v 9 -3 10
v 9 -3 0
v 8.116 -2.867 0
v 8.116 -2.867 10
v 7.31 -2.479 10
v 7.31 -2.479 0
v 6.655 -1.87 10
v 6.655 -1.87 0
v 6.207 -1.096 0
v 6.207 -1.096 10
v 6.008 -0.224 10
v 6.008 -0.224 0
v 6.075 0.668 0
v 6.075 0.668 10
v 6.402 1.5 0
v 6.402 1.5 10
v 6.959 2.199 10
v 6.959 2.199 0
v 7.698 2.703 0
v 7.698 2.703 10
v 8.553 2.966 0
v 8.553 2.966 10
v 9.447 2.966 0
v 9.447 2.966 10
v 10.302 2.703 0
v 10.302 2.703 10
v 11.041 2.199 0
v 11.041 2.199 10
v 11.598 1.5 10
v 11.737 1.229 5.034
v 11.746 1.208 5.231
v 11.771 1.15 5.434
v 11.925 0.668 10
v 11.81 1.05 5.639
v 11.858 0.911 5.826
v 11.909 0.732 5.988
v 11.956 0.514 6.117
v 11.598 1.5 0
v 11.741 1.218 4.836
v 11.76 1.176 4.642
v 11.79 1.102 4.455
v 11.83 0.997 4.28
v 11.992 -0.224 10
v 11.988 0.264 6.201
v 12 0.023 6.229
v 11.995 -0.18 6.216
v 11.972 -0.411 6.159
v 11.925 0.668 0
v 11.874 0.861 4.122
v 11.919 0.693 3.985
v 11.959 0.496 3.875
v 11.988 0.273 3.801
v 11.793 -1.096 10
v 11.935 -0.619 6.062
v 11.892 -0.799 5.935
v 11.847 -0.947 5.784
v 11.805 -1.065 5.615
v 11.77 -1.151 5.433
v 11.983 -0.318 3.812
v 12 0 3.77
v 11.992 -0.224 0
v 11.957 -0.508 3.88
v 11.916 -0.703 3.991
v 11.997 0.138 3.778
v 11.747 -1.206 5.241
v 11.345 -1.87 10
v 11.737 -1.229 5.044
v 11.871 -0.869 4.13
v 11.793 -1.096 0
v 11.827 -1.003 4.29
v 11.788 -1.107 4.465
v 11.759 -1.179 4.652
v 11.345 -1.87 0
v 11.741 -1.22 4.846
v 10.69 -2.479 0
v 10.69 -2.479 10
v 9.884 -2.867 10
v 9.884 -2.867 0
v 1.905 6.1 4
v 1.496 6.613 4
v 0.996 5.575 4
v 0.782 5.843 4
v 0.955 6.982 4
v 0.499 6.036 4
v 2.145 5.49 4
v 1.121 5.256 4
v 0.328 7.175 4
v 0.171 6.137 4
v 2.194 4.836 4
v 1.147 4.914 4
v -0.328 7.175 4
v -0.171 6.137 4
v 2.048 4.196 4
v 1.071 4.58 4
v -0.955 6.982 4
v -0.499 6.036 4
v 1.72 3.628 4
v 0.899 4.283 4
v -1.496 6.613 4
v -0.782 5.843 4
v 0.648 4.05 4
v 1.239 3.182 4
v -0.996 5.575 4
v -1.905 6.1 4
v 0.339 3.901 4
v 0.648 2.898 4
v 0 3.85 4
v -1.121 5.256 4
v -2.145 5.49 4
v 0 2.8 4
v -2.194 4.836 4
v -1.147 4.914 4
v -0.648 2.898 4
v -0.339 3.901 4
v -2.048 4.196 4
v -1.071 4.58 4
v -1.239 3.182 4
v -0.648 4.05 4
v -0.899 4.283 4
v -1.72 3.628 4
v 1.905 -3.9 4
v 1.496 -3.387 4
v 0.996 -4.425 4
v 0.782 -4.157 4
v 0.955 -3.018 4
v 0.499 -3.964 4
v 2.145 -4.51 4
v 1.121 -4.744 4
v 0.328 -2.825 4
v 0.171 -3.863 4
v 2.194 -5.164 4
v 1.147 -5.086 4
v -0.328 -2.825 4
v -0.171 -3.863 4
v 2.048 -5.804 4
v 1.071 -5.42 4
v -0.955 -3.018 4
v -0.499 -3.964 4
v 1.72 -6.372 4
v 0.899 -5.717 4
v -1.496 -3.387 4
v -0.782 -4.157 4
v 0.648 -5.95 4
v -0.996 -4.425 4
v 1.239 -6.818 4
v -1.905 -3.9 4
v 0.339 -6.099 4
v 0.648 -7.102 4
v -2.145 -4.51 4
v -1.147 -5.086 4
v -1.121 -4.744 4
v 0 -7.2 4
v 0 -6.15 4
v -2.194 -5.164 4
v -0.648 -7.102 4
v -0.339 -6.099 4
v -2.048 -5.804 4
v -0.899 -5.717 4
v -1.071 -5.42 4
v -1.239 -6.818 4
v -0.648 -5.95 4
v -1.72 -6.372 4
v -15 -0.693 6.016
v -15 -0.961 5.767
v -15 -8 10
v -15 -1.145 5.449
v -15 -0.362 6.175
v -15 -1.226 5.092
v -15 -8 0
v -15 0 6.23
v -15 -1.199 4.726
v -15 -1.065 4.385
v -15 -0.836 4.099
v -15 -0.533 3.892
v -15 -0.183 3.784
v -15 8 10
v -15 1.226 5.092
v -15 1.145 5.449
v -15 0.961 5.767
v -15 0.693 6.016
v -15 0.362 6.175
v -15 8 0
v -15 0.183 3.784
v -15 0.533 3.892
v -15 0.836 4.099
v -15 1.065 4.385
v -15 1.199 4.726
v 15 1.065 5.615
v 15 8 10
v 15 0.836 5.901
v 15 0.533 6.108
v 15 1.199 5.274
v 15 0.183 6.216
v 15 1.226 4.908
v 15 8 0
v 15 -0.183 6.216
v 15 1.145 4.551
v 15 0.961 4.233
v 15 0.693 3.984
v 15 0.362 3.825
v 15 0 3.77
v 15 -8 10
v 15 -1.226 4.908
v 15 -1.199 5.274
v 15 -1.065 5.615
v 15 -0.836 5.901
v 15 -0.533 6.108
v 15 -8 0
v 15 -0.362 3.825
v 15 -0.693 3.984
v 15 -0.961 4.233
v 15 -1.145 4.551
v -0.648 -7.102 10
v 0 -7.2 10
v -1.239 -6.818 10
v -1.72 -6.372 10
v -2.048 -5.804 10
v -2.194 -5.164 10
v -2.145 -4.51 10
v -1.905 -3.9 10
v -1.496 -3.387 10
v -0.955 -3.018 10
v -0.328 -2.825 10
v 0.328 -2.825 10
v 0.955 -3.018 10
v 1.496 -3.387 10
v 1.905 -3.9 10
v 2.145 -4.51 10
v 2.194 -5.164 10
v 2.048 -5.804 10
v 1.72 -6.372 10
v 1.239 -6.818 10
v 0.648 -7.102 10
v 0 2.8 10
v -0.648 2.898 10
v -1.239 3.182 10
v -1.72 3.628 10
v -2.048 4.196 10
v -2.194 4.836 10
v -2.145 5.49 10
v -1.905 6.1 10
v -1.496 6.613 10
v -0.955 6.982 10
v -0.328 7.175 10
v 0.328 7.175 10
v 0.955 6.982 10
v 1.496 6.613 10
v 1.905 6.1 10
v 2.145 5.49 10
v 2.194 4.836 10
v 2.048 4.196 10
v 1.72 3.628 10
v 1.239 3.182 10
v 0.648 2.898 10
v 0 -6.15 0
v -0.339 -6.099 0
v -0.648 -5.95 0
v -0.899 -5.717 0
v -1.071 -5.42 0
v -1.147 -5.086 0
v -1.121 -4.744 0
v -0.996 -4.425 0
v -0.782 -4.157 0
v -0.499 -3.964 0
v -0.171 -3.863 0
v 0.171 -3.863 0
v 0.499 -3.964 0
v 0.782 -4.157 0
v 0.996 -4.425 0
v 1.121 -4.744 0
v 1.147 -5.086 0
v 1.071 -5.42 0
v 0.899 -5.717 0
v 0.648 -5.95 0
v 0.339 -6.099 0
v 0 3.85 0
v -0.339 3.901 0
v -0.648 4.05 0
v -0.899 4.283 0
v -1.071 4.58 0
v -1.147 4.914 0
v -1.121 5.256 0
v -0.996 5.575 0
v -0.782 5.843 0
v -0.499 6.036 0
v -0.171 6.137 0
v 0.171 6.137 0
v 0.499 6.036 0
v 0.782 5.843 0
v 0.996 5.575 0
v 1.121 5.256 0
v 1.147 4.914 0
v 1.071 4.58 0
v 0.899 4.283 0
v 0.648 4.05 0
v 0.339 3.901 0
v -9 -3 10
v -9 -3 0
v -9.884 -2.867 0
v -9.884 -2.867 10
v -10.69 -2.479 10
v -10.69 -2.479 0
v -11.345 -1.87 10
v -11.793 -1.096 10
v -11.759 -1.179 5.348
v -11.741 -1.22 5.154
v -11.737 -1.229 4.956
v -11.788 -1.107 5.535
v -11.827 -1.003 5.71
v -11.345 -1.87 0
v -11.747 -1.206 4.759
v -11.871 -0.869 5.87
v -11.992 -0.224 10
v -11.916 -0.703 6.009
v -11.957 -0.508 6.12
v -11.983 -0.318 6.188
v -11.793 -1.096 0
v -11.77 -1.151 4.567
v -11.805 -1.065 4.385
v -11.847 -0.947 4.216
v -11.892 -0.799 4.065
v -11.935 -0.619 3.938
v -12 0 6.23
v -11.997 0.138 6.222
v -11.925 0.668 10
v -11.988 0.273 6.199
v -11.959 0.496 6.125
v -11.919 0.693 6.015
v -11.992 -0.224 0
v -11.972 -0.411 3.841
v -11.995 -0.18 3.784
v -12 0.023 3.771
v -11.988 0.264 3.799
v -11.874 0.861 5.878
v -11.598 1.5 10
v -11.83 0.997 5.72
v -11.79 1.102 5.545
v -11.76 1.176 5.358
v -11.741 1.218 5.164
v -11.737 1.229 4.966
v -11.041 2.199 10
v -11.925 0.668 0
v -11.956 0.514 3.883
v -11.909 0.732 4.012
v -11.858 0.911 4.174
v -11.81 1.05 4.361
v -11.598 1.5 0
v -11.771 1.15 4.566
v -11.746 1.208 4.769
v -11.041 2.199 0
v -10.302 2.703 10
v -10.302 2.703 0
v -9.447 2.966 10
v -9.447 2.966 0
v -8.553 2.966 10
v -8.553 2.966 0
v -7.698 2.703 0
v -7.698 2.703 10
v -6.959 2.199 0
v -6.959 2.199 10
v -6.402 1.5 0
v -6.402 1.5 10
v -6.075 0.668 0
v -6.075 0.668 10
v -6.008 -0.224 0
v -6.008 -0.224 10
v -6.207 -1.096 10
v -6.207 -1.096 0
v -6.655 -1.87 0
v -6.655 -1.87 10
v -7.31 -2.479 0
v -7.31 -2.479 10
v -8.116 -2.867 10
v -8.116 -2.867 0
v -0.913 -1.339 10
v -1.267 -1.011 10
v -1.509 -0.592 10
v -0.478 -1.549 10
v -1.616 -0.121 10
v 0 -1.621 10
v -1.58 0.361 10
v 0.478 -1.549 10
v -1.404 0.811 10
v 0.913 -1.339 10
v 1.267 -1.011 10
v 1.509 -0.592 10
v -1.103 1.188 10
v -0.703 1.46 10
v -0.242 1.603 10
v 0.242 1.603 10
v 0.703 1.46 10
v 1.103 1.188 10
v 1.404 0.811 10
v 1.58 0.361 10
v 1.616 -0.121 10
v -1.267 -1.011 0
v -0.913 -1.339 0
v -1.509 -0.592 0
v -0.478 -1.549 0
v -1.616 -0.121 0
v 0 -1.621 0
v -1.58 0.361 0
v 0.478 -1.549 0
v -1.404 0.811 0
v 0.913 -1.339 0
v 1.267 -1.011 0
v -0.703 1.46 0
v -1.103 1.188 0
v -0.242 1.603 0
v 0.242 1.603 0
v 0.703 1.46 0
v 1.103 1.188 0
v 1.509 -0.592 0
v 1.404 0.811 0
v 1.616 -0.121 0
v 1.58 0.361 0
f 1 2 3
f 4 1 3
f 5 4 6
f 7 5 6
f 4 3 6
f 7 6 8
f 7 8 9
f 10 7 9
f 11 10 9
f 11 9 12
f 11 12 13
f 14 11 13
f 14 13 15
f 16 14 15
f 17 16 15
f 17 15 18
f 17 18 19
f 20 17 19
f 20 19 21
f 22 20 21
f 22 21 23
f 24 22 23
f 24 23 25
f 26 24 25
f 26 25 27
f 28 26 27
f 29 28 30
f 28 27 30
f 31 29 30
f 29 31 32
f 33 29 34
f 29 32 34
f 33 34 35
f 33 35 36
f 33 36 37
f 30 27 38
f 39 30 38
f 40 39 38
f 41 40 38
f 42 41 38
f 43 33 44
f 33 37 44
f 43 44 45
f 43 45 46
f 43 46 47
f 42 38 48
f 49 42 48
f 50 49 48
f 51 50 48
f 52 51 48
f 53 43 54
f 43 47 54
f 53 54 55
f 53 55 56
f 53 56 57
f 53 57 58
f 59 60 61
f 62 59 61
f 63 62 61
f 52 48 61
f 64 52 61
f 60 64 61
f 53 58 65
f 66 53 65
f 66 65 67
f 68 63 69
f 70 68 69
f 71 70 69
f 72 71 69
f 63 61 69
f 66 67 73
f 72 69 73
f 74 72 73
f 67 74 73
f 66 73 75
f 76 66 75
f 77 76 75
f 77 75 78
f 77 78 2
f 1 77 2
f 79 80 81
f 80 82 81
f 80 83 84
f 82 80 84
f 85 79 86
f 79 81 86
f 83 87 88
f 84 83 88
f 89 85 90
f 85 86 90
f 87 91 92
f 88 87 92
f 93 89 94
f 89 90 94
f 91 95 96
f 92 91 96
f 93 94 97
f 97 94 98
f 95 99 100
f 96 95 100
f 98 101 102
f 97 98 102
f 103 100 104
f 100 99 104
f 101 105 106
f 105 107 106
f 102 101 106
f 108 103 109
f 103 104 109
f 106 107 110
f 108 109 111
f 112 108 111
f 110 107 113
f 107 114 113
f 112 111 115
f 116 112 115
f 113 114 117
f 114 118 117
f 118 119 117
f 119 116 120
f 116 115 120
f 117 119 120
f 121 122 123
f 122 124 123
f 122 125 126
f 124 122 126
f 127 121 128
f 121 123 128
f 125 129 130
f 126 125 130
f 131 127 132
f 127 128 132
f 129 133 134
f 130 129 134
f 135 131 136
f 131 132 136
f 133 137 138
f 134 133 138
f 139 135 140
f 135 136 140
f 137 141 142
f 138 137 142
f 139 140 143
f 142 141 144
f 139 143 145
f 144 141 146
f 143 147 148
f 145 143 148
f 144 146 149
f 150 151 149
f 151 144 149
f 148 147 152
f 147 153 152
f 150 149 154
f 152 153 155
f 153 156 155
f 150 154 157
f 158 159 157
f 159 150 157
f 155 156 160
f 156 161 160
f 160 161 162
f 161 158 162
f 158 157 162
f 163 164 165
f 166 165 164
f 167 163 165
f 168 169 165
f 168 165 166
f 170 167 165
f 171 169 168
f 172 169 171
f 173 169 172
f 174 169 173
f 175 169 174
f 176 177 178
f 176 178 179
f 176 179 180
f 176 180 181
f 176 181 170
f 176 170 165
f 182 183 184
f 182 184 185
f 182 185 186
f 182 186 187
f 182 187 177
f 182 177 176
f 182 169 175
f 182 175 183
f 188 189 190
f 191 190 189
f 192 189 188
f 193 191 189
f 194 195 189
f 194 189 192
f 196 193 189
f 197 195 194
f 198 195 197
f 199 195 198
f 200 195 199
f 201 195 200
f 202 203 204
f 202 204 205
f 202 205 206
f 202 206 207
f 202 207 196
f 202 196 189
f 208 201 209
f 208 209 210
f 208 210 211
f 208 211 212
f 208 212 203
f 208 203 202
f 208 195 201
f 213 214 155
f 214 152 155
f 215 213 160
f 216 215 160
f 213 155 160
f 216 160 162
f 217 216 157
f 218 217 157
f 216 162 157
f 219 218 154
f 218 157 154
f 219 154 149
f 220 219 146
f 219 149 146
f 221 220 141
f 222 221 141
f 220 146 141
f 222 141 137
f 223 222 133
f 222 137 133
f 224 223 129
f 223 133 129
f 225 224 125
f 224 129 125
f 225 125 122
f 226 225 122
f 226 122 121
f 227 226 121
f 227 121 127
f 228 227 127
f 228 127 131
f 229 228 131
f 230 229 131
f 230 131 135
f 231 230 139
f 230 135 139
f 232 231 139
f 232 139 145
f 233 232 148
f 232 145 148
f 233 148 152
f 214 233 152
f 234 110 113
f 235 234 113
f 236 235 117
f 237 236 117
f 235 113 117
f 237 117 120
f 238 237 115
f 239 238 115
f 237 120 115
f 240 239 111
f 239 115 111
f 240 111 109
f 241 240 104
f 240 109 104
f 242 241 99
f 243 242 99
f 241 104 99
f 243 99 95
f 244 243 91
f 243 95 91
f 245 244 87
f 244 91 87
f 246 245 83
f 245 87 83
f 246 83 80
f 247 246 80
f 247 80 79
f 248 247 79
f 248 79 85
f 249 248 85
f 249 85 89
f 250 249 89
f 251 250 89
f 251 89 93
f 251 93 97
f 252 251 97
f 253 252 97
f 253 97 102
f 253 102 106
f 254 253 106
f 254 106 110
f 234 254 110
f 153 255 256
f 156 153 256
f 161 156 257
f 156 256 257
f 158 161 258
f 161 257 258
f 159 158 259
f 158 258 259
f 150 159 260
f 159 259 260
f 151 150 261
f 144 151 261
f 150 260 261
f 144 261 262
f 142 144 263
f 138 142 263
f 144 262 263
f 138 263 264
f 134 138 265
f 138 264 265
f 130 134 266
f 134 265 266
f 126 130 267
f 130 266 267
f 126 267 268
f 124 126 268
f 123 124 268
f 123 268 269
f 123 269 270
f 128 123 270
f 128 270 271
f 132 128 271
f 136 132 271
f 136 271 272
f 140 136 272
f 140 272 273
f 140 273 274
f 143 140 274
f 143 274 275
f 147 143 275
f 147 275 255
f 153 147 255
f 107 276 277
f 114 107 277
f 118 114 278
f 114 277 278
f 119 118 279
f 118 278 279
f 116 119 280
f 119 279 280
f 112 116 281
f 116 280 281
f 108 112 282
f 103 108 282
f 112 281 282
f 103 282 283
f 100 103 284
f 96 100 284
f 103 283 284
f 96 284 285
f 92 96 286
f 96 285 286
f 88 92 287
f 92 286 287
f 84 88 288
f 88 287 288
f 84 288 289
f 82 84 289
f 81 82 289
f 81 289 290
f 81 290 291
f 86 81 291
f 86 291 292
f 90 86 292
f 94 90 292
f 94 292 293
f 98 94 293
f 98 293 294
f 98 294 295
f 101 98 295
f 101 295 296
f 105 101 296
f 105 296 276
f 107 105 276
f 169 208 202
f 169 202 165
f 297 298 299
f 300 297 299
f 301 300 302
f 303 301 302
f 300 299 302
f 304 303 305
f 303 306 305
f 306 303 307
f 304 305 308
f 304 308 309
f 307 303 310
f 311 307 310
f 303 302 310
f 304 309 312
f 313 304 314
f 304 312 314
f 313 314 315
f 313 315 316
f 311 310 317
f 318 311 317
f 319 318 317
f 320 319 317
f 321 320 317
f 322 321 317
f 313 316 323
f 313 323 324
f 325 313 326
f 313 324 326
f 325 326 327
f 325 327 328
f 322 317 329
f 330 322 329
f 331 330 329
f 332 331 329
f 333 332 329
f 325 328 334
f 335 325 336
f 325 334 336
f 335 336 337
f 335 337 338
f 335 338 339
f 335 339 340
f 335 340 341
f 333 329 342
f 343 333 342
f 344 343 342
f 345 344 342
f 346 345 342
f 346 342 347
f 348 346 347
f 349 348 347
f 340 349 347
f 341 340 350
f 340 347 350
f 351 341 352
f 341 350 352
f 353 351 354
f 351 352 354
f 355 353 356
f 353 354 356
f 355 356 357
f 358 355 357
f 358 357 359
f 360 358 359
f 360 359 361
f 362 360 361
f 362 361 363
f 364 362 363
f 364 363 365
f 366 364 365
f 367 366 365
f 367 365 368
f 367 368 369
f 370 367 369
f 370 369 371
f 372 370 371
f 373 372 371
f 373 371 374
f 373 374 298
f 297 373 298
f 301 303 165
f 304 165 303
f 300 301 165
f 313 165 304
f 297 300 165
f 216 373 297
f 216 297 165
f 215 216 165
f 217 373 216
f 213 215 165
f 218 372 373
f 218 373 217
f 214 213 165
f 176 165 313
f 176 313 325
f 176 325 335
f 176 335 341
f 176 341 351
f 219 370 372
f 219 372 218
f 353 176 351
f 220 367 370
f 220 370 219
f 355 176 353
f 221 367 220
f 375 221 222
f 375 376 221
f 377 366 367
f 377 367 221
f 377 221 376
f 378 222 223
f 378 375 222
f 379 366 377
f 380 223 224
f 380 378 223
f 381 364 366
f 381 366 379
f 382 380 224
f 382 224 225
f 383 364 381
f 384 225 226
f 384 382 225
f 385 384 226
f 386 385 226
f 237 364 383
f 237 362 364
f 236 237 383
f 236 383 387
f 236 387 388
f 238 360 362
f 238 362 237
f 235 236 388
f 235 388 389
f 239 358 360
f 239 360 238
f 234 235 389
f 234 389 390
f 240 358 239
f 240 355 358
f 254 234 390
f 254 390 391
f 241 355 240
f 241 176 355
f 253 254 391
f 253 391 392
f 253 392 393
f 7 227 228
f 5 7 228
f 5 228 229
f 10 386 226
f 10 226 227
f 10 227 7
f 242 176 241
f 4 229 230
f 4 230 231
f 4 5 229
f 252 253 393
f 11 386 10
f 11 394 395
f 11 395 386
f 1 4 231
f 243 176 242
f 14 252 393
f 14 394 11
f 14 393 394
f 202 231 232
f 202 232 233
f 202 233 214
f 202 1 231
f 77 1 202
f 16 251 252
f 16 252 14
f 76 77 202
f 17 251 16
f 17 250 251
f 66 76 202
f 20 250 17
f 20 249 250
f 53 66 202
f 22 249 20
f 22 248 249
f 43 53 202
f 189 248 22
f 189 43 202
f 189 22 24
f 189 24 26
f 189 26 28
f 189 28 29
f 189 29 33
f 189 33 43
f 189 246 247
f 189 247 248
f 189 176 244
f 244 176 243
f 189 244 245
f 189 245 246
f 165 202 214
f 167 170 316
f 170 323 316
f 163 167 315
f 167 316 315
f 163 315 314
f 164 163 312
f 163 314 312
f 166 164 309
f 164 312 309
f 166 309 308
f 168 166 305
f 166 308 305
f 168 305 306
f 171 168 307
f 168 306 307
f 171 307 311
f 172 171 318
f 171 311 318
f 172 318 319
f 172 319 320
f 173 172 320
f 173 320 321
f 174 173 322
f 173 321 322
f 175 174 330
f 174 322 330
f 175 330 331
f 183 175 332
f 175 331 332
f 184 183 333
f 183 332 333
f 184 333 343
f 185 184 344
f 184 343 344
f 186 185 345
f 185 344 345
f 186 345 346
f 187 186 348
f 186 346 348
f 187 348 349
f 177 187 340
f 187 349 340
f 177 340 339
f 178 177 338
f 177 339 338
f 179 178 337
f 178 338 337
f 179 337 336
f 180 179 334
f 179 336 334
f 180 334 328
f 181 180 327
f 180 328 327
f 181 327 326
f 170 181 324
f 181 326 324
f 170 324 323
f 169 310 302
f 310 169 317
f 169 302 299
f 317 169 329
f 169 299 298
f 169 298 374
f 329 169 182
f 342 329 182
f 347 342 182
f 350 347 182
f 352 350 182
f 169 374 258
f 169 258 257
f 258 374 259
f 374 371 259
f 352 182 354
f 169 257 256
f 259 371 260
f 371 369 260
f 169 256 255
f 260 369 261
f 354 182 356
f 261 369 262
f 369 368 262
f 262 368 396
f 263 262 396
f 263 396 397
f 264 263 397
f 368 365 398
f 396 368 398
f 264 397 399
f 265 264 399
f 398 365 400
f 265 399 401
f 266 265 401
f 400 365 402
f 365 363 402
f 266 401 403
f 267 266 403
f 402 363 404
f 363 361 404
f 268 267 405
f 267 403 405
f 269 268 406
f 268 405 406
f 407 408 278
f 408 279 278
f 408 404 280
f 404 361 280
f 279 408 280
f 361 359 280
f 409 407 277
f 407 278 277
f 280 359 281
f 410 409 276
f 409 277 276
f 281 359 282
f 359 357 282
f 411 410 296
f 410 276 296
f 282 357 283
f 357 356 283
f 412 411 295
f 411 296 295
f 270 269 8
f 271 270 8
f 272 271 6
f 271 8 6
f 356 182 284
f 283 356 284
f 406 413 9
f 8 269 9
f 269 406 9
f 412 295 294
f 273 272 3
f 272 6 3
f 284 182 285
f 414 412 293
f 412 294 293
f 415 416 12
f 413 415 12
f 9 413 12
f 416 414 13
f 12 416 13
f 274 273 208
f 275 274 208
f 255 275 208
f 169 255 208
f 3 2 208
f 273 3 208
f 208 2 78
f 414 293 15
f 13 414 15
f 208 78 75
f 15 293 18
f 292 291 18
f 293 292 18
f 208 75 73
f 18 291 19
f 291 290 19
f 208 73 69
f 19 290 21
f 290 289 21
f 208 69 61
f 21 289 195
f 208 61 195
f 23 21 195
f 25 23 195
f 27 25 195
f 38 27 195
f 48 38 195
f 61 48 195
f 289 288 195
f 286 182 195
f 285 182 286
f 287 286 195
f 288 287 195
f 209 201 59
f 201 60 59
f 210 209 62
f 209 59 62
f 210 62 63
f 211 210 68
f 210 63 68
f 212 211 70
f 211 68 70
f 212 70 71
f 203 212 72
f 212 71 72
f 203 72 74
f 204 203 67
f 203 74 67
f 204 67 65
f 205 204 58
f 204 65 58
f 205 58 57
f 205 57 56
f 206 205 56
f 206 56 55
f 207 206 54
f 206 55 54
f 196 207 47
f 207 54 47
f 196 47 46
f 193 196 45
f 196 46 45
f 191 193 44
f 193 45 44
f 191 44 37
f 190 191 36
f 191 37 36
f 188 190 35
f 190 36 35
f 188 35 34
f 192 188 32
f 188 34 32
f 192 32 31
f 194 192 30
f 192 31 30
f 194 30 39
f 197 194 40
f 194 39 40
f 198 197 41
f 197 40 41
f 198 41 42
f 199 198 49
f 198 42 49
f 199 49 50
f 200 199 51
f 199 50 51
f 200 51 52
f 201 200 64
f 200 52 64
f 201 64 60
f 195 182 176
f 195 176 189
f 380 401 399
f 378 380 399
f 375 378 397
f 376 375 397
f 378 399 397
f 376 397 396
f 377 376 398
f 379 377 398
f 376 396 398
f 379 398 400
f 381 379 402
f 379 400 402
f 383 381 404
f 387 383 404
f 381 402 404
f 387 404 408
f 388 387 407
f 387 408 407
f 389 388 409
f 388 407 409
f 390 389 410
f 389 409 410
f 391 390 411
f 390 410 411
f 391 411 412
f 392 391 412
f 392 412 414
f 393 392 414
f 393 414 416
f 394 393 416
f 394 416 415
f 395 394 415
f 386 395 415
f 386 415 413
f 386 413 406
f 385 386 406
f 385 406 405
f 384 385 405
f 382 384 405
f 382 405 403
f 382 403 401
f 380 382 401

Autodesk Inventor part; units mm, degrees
ref_plane "YZ Plane" through (0, 0, 0) normal (1, 0, 0) x (0, 1, 0)
ref_plane "XZ Plane" through (0, 0, 0) normal (0, 1, 0) x (-1, 0, 0)
ref_plane "XY Plane" through (0, 0, 0) normal (0, 0, 1) x (1, 0, 0)
sketch "Skizze1" plane through (0, 0, 0) normal (0, 0, 1) x (1, 0, 0)
  line L0 (-15, 8) -> (15, 8)
  line L1 (15, 8) -> (15, -8)
  line L2 (15, -8) -> (-15, -8)
  line L3 (-15, -8) -> (-15, 8)
  line L4 (-21, 0) -> (21, 0) projected
  line L5 (0, -11.2) -> (0, 11.2) projected
  point P0 (0, 0)
  dimension "d0" = 16
  dimension "d1" = 30
extrude "Extrusion1" add sketch "Skizze1" along normal blind 10
sketch "Skizze2" plane through (0, 0, 10) normal (0, 0, 1) x (1, 0, 0)
  line L0 (-21, 0) -> (21, 0) projected
  line L1 (0, -11.2) -> (0, 11.2) projected
  point P0 (0, 0)
  point P1 (-9, 0)
  point P2 (9, 0)
  dimension "d4" = 18
hole "Bohrung1" at (-9, 0, 10) at (9, 0, 10) direction (0, 0, -1) diameter 6 end through all
sketch "Skizze3" plane through (0, 0, 10) normal (0, 0, 1) x (1, 0, 0)
  line L0 (0, -11.2) -> (0, 11.2) projected
  line L1 (-21, 0) -> (21, 0) projected
  point P0 (0, 0)
  point P1 (0, 5)
  point P2 (0, -5)
  dimension "d12" = 10
hole "Bohrung2" at (0, 5, 10) at (0, -5, 10) direction (0, 0, -1) diameter 2.3 end through all counterbore diameter 4.4 counterbore depth 6
sketch "Skizze4" plane through (0, 0, 10) normal (0, 0, 1) x (1, 0, 0)
  point P0 (0, 0)
  point P1 (0, 0)
hole "Bohrung3" at (0, 0, 10) direction (0, 0, -1) diameter 3.242 end through all thread size "M4x0.7" class "6H" standard "ISO Metric profile"
sketch "Skizze5" plane through (-15, -8, 0) normal (-1, 0, 0) x (0, 0, 1)
  line L0 (10, 0) -> (10, 16) projected
  line L1 (0, 16) -> (10, 16) projected
  line L2 (0, 0) -> (10, 0) projected
  line L3 (0, 8) -> (10, 8)
  line L4 (5, 16) -> (5, 0)
  point P0 (5, 8)
hole "Bohrung4" at (-15, 0, 5) direction (1, 0, 0) diameter 2.459 end up to surface thread size "M3x0.5" class "6H" standard "ISO Metric profile"
mirror "Spiegeln1" about plane through (0, 0, 0) normal (1, 0, 0) of "Bohrung4"
properties part number "13_0204_020"
